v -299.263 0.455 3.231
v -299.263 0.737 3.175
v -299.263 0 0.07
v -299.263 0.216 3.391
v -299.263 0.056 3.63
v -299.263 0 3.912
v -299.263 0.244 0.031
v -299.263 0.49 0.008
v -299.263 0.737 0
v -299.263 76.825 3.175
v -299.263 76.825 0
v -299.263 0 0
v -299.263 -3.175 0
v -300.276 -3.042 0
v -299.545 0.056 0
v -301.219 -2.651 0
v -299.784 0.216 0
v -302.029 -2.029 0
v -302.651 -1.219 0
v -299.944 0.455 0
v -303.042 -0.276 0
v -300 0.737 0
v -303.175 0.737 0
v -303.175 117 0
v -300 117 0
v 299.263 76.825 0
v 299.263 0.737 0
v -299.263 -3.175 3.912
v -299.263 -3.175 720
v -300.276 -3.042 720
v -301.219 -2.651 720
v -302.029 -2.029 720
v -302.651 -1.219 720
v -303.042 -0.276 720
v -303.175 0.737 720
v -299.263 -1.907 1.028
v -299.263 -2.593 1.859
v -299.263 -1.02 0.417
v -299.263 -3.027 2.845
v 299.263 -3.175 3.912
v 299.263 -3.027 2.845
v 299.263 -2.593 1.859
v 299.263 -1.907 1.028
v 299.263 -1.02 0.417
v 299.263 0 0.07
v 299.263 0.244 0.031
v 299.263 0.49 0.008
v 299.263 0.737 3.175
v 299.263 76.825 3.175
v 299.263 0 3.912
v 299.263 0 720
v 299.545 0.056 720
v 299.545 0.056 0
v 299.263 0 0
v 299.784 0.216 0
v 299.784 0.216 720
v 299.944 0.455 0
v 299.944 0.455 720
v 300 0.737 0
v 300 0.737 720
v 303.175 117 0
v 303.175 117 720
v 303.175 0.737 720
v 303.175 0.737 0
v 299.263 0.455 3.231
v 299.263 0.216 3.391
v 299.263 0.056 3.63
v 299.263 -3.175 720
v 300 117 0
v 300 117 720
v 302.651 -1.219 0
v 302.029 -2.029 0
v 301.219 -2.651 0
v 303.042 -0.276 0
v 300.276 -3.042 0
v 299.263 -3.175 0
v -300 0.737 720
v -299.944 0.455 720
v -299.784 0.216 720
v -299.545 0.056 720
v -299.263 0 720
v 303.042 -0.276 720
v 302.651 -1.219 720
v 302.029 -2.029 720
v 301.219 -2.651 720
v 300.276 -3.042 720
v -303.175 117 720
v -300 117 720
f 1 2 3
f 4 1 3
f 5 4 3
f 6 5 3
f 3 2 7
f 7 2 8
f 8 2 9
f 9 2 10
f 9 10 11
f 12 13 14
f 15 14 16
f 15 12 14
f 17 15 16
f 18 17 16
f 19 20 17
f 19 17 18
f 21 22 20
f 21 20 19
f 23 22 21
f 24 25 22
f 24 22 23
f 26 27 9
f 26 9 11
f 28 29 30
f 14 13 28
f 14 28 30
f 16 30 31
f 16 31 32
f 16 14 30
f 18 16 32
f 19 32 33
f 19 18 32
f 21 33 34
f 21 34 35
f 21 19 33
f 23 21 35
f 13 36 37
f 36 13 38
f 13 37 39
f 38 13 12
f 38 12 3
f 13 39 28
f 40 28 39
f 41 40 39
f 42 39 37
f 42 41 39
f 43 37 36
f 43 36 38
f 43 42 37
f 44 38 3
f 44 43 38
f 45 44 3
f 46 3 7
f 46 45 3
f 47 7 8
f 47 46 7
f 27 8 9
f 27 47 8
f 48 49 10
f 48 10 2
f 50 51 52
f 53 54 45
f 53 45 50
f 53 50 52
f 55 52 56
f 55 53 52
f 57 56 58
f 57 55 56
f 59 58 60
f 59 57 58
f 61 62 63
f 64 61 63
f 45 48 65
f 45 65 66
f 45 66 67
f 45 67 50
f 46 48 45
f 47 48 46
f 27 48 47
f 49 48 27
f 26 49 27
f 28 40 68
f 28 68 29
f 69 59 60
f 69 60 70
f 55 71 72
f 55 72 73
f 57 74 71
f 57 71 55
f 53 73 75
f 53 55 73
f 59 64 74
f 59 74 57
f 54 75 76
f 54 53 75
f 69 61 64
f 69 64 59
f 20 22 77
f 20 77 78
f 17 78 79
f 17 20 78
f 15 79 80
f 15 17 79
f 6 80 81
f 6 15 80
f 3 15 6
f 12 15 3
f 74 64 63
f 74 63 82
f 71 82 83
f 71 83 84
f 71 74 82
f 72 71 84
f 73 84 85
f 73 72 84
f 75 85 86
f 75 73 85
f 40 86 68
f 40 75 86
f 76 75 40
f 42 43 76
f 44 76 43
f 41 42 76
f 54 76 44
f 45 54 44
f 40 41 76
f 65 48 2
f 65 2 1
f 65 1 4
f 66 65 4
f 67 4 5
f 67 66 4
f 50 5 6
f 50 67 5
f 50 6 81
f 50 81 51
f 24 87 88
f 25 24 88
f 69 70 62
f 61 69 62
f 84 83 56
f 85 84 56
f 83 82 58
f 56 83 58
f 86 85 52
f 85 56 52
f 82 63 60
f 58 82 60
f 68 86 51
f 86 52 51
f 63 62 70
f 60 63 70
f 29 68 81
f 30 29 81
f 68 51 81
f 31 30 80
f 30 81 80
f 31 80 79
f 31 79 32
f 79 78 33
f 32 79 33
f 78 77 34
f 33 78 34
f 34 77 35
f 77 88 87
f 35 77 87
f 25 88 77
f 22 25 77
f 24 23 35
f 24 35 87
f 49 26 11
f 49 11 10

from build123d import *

# Parameters (mm, degrees)
BASE_FLANGE1_DEPTH           = 720
EDGE_FLANGE1_STRIP_W         = 14.1732
EDGE_FLANGE1_STRIP_H         = 3.175
EDGE_FLANGE1_STRIP_CUT_DEPTH = 598.5268
EDGE_FLANGE1_DEPTH           = 598.5268


# Sheet-metal steps are written as plain solids
with BuildPart() as part:
    # Sketch1 → Base-Flange1 (new body)
    with BuildSketch(Plane.XY):
        with BuildLine():
            Line((-300, 117), (-300, 0.7366))
            ThreePointArc((-300, 0.7366), (-299.784254855, 0.215745145), (-299.2634, 0))
            Line((-299.2634, 0), (299.2634, 0))
            ThreePointArc((299.2634, 0), (299.784254855, 0.215745145), (300, 0.7366))
            Line((300, 0.7366), (300, 117))
            Line((300, 117), (303.175, 117))
            Line((303.175, 117), (303.175, 0.7366))
            ThreePointArc((303.175, 0.7366), (302.029318885, -2.029318885), (299.2634, -3.175))
            Line((299.2634, -3.175), (-299.2634, -3.175))
            ThreePointArc((-299.2634, -3.175), (-302.029318885, -2.029318885), (-303.175, 0.7366))
            Line((-303.175, 0.7366), (-303.175, 117))
            Line((-303.175, 117), (-300, 117))
        make_face()
    extrude(amount=BASE_FLANGE1_DEPTH)

    # Edge-Flange1 strip (across the edge) → Edge-Flange1 strip cut (cut)
    with BuildSketch(Plane.ZY.offset(-299.2634)):
        with Locations((-3.175, -1.5875)):
            Rectangle(EDGE_FLANGE1_STRIP_W, EDGE_FLANGE1_STRIP_H)
    extrude(amount=EDGE_FLANGE1_STRIP_CUT_DEPTH, mode=Mode.SUBTRACT)

    # Edge-Flange1 section (across the edge) → Edge-Flange1 (add)
    with BuildSketch(Plane.ZY.offset(-299.2634)):
        with BuildLine():
            Line((0, 0.7366), (0, 76.825))
            Line((0, 76.825), (3.175, 76.825))
            Line((3.175, 76.825), (3.175, 0.7366))
            ThreePointArc((3.175, 0.7366), (3.390745145, 0.215745145), (3.9116, 0))
            Line((3.9116, 0), (3.9116, -3.175))
            ThreePointArc((3.9116, -3.175), (1.145681115, -2.029318885), (0, 0.7366))
        make_face()
    extrude(amount=EDGE_FLANGE1_DEPTH)


solid = part.part
